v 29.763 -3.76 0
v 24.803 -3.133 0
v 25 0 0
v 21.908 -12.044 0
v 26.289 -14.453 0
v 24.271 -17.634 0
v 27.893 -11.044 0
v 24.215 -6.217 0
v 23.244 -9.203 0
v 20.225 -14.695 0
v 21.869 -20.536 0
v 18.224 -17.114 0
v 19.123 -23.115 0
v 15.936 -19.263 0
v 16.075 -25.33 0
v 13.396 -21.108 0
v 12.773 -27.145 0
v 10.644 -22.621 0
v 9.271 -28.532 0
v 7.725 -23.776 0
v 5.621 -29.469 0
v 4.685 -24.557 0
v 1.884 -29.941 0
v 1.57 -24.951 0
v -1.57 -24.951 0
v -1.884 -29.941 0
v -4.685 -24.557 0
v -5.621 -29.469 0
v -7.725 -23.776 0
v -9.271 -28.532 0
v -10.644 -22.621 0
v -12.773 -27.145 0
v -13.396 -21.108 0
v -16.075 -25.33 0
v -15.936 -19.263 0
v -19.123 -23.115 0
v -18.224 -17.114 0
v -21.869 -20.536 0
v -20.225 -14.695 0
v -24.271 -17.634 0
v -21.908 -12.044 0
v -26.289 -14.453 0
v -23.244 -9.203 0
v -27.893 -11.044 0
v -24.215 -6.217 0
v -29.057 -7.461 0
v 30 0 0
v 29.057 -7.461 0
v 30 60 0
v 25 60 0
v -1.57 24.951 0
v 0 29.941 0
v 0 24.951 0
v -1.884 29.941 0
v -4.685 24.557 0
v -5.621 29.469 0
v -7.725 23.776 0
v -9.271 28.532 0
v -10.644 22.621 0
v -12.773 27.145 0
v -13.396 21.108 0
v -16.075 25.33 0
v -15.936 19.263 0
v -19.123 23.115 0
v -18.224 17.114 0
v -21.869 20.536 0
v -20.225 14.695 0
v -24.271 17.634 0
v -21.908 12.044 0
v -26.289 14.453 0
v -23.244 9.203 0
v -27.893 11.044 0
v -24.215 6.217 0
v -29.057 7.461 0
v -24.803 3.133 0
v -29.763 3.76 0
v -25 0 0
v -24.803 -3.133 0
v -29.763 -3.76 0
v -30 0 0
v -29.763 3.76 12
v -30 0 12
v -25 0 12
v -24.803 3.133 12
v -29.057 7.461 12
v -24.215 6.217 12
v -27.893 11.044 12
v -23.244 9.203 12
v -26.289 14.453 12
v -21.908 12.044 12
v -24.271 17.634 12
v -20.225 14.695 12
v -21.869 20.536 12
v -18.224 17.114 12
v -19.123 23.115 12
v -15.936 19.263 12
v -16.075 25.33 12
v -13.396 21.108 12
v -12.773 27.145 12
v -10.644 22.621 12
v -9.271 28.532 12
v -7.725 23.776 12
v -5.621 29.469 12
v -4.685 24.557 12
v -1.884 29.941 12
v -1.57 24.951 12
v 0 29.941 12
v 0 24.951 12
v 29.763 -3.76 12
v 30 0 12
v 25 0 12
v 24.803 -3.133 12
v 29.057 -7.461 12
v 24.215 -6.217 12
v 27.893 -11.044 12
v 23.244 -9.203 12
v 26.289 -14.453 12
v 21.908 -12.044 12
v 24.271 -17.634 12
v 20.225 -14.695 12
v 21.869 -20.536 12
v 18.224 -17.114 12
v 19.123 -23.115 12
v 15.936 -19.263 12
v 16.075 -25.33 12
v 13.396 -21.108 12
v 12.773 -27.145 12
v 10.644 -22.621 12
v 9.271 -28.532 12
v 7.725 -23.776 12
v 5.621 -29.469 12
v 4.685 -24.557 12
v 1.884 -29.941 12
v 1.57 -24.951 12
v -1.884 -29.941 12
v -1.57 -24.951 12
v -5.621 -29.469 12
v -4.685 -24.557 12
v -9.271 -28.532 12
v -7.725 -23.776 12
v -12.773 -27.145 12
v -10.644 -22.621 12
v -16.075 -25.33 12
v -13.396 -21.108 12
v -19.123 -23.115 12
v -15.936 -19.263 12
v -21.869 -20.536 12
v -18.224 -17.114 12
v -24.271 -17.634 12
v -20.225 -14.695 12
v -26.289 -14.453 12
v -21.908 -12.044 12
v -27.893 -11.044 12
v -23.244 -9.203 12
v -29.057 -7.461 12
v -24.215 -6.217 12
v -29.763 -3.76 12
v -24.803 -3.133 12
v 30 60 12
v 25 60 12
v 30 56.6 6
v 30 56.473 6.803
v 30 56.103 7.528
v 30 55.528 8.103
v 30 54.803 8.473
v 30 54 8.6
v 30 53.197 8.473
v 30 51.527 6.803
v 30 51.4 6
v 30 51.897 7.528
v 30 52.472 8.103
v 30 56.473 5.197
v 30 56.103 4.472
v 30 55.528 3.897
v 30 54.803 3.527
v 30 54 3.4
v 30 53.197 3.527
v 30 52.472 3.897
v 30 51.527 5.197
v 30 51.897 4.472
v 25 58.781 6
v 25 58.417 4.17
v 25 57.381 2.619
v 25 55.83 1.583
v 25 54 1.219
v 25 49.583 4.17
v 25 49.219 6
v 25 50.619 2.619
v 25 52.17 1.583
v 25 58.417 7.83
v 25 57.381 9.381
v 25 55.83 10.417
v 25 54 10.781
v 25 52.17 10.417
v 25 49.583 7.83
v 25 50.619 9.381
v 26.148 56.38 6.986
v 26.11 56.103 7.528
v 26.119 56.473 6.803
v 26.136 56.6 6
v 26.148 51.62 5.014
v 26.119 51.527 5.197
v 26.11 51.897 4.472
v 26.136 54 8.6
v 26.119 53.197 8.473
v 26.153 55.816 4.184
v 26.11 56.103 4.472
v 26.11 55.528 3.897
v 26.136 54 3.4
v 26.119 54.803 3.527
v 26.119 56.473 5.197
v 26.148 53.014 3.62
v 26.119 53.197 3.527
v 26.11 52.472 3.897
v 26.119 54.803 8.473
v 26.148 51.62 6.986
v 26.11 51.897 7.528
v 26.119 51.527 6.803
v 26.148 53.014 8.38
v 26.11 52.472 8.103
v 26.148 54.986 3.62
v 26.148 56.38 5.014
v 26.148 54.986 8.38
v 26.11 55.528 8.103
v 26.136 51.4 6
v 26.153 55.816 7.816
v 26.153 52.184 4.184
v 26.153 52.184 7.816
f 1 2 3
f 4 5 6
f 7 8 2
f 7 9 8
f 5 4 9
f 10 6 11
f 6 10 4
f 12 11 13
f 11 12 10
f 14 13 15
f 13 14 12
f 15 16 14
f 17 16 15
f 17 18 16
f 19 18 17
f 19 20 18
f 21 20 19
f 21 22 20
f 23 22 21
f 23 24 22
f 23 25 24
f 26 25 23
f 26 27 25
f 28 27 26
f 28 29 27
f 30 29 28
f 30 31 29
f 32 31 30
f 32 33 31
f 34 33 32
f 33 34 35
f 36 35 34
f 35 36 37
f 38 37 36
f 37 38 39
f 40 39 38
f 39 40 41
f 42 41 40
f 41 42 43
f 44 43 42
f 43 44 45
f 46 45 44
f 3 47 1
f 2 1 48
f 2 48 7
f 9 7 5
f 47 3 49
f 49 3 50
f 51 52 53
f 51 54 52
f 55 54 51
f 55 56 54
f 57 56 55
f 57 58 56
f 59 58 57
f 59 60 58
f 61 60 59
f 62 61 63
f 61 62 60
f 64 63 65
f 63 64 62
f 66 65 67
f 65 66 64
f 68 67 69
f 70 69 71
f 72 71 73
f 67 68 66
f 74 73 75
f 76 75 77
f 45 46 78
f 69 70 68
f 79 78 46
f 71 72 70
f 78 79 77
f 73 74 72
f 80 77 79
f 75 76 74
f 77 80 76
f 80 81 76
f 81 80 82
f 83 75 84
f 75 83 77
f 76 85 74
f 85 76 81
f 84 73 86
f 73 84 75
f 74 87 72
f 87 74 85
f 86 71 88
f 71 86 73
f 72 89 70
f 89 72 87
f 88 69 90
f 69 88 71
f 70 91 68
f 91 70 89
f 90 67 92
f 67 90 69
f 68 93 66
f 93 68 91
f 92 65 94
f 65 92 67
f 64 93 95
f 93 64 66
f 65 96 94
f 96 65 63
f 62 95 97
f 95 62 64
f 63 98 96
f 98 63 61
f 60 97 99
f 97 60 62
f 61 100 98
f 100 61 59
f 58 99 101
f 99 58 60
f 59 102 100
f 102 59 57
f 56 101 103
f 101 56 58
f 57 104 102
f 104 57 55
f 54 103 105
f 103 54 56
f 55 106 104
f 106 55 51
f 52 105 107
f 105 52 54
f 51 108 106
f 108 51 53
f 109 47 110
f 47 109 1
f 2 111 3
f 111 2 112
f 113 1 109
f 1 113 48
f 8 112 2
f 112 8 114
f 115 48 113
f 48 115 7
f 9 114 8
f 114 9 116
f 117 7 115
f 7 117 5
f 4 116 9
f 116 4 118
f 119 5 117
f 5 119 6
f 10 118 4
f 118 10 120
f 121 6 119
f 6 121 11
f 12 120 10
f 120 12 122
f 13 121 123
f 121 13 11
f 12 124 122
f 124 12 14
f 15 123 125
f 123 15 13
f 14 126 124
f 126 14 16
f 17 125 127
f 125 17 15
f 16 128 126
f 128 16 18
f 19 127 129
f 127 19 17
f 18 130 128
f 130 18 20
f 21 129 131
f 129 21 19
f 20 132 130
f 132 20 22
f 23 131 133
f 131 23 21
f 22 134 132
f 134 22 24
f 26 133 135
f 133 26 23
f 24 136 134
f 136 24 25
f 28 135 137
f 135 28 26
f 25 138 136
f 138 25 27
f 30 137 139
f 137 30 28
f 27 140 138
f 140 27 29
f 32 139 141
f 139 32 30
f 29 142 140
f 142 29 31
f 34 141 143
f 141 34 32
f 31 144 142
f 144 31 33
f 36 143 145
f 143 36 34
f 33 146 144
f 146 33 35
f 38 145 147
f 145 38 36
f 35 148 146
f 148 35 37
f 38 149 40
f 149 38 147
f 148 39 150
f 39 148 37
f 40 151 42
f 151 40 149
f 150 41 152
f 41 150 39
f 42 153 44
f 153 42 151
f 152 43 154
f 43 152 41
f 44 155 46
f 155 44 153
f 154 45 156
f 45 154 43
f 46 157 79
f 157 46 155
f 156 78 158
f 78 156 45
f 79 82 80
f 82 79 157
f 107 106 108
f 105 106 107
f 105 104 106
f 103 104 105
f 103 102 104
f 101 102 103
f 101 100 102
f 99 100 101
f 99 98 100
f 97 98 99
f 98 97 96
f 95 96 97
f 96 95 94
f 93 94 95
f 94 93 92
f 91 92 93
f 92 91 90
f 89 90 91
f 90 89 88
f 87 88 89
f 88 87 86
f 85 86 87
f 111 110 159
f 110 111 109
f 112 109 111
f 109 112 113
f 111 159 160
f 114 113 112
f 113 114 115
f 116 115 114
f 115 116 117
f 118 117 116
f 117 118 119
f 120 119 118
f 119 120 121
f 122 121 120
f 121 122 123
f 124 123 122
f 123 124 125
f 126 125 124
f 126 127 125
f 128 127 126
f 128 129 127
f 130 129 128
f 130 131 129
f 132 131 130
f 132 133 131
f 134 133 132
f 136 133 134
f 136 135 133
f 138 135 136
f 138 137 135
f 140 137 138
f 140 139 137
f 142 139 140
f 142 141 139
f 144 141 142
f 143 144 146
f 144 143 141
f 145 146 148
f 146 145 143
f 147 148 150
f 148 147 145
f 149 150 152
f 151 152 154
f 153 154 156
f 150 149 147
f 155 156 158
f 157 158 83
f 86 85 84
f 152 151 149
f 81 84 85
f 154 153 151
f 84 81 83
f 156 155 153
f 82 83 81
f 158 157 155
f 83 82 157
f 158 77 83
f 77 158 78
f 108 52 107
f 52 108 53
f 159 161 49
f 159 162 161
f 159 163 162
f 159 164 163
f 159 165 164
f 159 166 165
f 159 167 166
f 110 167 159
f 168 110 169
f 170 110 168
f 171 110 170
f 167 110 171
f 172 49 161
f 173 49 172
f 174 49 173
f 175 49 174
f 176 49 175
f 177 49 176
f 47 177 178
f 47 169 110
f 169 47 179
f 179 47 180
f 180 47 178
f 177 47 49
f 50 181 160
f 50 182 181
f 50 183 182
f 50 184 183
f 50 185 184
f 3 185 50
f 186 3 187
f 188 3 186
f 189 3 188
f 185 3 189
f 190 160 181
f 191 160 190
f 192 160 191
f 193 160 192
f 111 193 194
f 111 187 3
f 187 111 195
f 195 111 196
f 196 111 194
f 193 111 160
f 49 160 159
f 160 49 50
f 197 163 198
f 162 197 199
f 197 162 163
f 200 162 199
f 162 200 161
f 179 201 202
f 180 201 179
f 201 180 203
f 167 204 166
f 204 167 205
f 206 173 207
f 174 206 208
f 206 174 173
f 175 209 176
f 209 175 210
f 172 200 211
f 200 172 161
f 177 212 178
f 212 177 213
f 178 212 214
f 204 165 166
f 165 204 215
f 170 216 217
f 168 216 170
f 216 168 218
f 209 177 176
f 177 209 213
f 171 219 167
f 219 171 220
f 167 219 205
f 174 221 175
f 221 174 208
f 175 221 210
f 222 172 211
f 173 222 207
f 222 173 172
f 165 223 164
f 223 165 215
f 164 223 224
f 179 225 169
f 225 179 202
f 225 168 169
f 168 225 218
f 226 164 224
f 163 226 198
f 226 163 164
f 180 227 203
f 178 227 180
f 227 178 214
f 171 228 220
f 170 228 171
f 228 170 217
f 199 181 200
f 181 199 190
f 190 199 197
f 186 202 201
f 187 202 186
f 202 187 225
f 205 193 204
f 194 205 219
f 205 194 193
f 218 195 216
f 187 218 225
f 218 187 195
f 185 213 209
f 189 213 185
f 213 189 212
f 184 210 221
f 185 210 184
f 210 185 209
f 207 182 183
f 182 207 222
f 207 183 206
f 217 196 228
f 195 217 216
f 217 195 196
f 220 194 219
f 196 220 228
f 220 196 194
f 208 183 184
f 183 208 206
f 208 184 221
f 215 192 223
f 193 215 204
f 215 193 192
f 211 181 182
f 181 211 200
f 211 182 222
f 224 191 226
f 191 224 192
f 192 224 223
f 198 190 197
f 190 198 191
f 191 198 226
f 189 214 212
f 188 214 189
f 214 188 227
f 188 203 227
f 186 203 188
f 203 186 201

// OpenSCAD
// Radius of hook [mm]
hookRadius=25; 
// Width of hook [mm]
width=12; 
//Thickness of hook [mm]
thickness=5; 
// Radius of mounting hole [mm]
holeRadius=2.6; 
// height of mounting section [mm]
height=60;  

union() {

	difference() {
		rotate_extrude(convexity = 10,$fn=50)
		translate([hookRadius, 0, 0])
		square([thickness,width]);
	
		translate([0,0,-1])
		cube([hookRadius*2,hookRadius*2,width+2]);
	}
	
	
	difference() {
		translate([hookRadius,0,0])
		cube([thickness,height,width]);
	
		translate([hookRadius-1,height-max(holeRadius*2, width/2),width/2])
		rotate([90,0,90])
		cylinder(r=holeRadius,h=thickness+2,$fn=20);
		translate([hookRadius-0.01,height-max(holeRadius*2, width/2),width/2])
		rotate([90,0,90])
		cylinder(r1=4.8,r2=0,h=min(thickness/2, 5));
	}
}
